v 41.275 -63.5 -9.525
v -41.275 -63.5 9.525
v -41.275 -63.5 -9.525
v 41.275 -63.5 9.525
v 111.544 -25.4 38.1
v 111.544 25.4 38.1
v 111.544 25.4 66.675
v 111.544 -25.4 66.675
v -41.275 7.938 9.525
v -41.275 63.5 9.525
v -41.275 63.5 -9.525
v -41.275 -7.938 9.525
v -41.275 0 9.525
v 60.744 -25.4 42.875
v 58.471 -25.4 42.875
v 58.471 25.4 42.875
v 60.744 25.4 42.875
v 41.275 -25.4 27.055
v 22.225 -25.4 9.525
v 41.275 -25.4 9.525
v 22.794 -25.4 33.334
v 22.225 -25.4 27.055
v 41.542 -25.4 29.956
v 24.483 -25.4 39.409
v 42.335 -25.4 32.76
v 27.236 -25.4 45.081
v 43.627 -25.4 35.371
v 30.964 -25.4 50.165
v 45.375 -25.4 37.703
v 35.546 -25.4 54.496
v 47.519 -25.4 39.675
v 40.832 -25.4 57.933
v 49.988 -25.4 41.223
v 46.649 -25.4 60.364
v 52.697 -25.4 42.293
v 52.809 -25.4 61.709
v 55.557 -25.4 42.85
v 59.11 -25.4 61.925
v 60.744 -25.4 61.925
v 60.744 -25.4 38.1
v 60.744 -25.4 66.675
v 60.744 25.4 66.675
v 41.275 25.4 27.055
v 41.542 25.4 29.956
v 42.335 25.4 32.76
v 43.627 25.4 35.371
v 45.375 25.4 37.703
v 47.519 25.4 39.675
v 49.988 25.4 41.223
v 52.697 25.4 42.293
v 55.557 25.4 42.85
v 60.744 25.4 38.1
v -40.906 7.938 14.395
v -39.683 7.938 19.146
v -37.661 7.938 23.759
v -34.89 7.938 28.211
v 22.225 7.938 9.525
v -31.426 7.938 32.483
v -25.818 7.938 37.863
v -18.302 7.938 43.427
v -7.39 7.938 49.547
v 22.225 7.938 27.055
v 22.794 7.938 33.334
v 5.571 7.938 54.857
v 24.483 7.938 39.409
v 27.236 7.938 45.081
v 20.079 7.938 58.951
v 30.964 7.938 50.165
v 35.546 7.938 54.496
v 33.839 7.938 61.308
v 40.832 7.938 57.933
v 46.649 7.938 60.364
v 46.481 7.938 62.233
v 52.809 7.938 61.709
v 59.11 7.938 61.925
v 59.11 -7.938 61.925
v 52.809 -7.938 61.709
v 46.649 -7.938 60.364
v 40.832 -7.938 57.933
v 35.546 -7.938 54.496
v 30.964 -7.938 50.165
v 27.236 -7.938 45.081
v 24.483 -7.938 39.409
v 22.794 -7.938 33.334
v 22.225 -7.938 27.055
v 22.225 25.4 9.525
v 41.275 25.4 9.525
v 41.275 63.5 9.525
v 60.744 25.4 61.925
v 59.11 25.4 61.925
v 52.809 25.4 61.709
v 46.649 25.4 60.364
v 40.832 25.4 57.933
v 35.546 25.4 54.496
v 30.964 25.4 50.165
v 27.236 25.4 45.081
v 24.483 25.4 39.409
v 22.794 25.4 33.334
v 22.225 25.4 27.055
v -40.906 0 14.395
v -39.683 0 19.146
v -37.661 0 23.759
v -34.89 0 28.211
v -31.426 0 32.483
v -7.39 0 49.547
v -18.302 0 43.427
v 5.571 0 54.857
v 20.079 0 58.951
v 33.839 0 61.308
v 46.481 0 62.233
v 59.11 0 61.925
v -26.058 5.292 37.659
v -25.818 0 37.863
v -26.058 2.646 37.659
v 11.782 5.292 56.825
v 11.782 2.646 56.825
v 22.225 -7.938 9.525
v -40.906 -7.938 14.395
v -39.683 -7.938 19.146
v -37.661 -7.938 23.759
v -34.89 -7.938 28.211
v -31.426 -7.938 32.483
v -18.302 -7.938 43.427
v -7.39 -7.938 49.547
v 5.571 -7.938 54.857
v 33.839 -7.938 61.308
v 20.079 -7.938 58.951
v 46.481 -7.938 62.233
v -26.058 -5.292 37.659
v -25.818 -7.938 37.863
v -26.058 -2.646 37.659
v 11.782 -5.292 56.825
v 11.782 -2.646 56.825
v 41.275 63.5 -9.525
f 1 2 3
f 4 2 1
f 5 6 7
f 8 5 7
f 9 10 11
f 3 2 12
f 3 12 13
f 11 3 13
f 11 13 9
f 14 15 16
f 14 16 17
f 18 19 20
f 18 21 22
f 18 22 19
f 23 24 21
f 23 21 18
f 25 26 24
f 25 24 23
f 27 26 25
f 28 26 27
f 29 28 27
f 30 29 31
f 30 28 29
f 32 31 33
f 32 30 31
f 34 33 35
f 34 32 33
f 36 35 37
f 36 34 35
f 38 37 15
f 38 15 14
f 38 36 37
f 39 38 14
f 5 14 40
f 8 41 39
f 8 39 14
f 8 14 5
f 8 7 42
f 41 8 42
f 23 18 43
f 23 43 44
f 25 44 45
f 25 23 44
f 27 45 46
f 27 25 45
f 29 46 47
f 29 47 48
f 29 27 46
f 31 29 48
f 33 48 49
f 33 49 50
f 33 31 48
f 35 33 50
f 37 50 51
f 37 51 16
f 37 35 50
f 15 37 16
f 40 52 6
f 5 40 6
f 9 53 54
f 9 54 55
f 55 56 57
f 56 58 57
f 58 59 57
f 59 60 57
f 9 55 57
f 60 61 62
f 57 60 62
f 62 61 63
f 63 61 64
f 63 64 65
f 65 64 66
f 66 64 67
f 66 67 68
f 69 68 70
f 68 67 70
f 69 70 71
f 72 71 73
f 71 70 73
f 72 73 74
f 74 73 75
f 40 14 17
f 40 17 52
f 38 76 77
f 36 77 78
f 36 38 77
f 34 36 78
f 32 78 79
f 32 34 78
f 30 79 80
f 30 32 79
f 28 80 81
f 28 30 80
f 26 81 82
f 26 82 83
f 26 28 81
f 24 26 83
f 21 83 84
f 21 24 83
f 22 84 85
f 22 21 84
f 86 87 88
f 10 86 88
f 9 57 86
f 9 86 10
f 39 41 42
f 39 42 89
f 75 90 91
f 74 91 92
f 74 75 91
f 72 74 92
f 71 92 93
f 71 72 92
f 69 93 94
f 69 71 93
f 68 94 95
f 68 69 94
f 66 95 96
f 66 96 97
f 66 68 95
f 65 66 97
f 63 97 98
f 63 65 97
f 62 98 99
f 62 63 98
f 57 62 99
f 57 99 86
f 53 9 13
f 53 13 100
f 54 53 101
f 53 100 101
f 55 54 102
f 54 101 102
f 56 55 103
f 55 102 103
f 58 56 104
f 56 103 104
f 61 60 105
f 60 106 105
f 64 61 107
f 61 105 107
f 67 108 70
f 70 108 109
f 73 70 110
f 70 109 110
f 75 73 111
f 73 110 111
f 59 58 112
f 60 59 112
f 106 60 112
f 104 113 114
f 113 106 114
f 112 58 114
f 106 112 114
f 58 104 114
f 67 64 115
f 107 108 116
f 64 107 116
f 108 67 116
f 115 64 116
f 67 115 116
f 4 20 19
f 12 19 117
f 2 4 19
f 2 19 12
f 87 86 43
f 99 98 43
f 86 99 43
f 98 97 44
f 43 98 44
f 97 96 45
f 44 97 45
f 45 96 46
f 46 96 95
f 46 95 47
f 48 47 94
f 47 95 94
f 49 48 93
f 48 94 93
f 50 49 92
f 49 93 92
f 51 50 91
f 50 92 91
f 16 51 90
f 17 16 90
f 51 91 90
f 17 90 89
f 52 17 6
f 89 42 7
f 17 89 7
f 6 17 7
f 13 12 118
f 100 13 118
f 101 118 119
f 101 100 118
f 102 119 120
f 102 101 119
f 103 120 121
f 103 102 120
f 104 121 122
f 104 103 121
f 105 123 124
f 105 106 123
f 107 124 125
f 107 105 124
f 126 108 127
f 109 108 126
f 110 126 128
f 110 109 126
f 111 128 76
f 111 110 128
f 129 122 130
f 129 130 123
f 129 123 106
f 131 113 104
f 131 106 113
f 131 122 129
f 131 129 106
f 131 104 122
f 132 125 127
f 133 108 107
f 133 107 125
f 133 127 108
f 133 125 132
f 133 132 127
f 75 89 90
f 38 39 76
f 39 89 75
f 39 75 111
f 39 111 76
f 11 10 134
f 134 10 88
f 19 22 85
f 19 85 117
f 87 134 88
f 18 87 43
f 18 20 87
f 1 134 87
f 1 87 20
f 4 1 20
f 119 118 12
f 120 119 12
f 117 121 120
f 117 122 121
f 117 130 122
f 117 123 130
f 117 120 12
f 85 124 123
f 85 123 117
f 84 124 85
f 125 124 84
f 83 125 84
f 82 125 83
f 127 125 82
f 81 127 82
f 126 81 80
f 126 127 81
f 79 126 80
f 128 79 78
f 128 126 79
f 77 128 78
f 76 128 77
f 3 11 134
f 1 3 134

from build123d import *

# Parameters (mm, degrees)
F1_DEPTH = 63.5
F2_DEPTH = 25.4
F3_DEPTH = 7.9375


with BuildPart() as f1:
    # F0 (on Front) → F1 (new body, symmetric)
    with BuildSketch(Plane.XZ):
        Polygon((41.275, -9.525), (41.275, 9.525), (22.225, 9.525), (-41.275, 9.525), (-41.275, -9.525), align=None)
    extrude(amount=F1_DEPTH, both=True)

    # F0 (on Front) → F2 (join, symmetric)
    with BuildSketch(Plane.XZ):
        with BuildLine():
            Line((22.225, 9.525), (41.275, 9.525))
            Line((41.275, 9.525), (41.275, 27.055227))
            ThreePointArc((41.275, 27.055227), (46.40173, 38.738134), (58.470631, 42.8752))
            Line((58.470631, 42.8752), (60.744337, 42.8752))
            Line((60.744337, 42.8752), (60.744337, 61.9252))
            Line((60.744337, 61.9252), (59.109739, 61.9252))
            ThreePointArc((59.109739, 61.9252), (33.15717, 52.434347), (22.225, 27.055227))
            Line((22.225, 27.055227), (22.225, 9.525))
        make_face()
        Polygon((60.744337, 61.9252), (60.744337, 42.8752), (60.744337, 38.1), (111.544337, 38.1), (111.544337, 66.675), (60.744337, 66.675), align=None)
    extrude(amount=F2_DEPTH, both=True)

    # F0 (on Front) → F3 (join, symmetric)
    with BuildSketch(Plane.XZ):
        Polygon((60.744337, 61.9252), (60.744337, 42.8752), (60.744337, 38.1), (111.544337, 38.1), (111.544337, 66.675), (60.744337, 66.675), align=None)
        Polygon((41.275, -9.525), (41.275, 9.525), (22.225, 9.525), (-41.275, 9.525), (-41.275, -9.525), align=None)
        with BuildLine():
            Line((22.225, 9.525), (41.275, 9.525))
            Line((41.275, 9.525), (41.275, 27.055227))
            ThreePointArc((41.275, 27.055227), (46.40173, 38.738134), (58.470631, 42.8752))
            Line((58.470631, 42.8752), (60.744337, 42.8752))
            Line((60.744337, 42.8752), (60.744337, 61.9252))
            Line((60.744337, 61.9252), (59.109739, 61.9252))
            ThreePointArc((59.109739, 61.9252), (33.15717, 52.434347), (22.225, 27.055227))
            Line((22.225, 27.055227), (22.225, 9.525))
        make_face()
        with BuildLine():
            Line((-41.275, 9.525), (22.225, 9.525))
            Line((22.225, 9.525), (22.225, 27.055227))
            ThreePointArc((22.225, 27.055227), (33.15717, 52.434347), (59.109739, 61.9252))
            add(Edge.make_bspline(
                [(-41.275, 9.525), (-41.747715, 40.443104), (11.415395, 65.556966), (59.109739, 61.9252)],
                knots=[0, 0, 0, 0, 113.238142, 113.238142, 113.238142, 113.238142], degree=3))
        make_face()
    extrude(amount=F3_DEPTH, both=True)


solid = f1.part
